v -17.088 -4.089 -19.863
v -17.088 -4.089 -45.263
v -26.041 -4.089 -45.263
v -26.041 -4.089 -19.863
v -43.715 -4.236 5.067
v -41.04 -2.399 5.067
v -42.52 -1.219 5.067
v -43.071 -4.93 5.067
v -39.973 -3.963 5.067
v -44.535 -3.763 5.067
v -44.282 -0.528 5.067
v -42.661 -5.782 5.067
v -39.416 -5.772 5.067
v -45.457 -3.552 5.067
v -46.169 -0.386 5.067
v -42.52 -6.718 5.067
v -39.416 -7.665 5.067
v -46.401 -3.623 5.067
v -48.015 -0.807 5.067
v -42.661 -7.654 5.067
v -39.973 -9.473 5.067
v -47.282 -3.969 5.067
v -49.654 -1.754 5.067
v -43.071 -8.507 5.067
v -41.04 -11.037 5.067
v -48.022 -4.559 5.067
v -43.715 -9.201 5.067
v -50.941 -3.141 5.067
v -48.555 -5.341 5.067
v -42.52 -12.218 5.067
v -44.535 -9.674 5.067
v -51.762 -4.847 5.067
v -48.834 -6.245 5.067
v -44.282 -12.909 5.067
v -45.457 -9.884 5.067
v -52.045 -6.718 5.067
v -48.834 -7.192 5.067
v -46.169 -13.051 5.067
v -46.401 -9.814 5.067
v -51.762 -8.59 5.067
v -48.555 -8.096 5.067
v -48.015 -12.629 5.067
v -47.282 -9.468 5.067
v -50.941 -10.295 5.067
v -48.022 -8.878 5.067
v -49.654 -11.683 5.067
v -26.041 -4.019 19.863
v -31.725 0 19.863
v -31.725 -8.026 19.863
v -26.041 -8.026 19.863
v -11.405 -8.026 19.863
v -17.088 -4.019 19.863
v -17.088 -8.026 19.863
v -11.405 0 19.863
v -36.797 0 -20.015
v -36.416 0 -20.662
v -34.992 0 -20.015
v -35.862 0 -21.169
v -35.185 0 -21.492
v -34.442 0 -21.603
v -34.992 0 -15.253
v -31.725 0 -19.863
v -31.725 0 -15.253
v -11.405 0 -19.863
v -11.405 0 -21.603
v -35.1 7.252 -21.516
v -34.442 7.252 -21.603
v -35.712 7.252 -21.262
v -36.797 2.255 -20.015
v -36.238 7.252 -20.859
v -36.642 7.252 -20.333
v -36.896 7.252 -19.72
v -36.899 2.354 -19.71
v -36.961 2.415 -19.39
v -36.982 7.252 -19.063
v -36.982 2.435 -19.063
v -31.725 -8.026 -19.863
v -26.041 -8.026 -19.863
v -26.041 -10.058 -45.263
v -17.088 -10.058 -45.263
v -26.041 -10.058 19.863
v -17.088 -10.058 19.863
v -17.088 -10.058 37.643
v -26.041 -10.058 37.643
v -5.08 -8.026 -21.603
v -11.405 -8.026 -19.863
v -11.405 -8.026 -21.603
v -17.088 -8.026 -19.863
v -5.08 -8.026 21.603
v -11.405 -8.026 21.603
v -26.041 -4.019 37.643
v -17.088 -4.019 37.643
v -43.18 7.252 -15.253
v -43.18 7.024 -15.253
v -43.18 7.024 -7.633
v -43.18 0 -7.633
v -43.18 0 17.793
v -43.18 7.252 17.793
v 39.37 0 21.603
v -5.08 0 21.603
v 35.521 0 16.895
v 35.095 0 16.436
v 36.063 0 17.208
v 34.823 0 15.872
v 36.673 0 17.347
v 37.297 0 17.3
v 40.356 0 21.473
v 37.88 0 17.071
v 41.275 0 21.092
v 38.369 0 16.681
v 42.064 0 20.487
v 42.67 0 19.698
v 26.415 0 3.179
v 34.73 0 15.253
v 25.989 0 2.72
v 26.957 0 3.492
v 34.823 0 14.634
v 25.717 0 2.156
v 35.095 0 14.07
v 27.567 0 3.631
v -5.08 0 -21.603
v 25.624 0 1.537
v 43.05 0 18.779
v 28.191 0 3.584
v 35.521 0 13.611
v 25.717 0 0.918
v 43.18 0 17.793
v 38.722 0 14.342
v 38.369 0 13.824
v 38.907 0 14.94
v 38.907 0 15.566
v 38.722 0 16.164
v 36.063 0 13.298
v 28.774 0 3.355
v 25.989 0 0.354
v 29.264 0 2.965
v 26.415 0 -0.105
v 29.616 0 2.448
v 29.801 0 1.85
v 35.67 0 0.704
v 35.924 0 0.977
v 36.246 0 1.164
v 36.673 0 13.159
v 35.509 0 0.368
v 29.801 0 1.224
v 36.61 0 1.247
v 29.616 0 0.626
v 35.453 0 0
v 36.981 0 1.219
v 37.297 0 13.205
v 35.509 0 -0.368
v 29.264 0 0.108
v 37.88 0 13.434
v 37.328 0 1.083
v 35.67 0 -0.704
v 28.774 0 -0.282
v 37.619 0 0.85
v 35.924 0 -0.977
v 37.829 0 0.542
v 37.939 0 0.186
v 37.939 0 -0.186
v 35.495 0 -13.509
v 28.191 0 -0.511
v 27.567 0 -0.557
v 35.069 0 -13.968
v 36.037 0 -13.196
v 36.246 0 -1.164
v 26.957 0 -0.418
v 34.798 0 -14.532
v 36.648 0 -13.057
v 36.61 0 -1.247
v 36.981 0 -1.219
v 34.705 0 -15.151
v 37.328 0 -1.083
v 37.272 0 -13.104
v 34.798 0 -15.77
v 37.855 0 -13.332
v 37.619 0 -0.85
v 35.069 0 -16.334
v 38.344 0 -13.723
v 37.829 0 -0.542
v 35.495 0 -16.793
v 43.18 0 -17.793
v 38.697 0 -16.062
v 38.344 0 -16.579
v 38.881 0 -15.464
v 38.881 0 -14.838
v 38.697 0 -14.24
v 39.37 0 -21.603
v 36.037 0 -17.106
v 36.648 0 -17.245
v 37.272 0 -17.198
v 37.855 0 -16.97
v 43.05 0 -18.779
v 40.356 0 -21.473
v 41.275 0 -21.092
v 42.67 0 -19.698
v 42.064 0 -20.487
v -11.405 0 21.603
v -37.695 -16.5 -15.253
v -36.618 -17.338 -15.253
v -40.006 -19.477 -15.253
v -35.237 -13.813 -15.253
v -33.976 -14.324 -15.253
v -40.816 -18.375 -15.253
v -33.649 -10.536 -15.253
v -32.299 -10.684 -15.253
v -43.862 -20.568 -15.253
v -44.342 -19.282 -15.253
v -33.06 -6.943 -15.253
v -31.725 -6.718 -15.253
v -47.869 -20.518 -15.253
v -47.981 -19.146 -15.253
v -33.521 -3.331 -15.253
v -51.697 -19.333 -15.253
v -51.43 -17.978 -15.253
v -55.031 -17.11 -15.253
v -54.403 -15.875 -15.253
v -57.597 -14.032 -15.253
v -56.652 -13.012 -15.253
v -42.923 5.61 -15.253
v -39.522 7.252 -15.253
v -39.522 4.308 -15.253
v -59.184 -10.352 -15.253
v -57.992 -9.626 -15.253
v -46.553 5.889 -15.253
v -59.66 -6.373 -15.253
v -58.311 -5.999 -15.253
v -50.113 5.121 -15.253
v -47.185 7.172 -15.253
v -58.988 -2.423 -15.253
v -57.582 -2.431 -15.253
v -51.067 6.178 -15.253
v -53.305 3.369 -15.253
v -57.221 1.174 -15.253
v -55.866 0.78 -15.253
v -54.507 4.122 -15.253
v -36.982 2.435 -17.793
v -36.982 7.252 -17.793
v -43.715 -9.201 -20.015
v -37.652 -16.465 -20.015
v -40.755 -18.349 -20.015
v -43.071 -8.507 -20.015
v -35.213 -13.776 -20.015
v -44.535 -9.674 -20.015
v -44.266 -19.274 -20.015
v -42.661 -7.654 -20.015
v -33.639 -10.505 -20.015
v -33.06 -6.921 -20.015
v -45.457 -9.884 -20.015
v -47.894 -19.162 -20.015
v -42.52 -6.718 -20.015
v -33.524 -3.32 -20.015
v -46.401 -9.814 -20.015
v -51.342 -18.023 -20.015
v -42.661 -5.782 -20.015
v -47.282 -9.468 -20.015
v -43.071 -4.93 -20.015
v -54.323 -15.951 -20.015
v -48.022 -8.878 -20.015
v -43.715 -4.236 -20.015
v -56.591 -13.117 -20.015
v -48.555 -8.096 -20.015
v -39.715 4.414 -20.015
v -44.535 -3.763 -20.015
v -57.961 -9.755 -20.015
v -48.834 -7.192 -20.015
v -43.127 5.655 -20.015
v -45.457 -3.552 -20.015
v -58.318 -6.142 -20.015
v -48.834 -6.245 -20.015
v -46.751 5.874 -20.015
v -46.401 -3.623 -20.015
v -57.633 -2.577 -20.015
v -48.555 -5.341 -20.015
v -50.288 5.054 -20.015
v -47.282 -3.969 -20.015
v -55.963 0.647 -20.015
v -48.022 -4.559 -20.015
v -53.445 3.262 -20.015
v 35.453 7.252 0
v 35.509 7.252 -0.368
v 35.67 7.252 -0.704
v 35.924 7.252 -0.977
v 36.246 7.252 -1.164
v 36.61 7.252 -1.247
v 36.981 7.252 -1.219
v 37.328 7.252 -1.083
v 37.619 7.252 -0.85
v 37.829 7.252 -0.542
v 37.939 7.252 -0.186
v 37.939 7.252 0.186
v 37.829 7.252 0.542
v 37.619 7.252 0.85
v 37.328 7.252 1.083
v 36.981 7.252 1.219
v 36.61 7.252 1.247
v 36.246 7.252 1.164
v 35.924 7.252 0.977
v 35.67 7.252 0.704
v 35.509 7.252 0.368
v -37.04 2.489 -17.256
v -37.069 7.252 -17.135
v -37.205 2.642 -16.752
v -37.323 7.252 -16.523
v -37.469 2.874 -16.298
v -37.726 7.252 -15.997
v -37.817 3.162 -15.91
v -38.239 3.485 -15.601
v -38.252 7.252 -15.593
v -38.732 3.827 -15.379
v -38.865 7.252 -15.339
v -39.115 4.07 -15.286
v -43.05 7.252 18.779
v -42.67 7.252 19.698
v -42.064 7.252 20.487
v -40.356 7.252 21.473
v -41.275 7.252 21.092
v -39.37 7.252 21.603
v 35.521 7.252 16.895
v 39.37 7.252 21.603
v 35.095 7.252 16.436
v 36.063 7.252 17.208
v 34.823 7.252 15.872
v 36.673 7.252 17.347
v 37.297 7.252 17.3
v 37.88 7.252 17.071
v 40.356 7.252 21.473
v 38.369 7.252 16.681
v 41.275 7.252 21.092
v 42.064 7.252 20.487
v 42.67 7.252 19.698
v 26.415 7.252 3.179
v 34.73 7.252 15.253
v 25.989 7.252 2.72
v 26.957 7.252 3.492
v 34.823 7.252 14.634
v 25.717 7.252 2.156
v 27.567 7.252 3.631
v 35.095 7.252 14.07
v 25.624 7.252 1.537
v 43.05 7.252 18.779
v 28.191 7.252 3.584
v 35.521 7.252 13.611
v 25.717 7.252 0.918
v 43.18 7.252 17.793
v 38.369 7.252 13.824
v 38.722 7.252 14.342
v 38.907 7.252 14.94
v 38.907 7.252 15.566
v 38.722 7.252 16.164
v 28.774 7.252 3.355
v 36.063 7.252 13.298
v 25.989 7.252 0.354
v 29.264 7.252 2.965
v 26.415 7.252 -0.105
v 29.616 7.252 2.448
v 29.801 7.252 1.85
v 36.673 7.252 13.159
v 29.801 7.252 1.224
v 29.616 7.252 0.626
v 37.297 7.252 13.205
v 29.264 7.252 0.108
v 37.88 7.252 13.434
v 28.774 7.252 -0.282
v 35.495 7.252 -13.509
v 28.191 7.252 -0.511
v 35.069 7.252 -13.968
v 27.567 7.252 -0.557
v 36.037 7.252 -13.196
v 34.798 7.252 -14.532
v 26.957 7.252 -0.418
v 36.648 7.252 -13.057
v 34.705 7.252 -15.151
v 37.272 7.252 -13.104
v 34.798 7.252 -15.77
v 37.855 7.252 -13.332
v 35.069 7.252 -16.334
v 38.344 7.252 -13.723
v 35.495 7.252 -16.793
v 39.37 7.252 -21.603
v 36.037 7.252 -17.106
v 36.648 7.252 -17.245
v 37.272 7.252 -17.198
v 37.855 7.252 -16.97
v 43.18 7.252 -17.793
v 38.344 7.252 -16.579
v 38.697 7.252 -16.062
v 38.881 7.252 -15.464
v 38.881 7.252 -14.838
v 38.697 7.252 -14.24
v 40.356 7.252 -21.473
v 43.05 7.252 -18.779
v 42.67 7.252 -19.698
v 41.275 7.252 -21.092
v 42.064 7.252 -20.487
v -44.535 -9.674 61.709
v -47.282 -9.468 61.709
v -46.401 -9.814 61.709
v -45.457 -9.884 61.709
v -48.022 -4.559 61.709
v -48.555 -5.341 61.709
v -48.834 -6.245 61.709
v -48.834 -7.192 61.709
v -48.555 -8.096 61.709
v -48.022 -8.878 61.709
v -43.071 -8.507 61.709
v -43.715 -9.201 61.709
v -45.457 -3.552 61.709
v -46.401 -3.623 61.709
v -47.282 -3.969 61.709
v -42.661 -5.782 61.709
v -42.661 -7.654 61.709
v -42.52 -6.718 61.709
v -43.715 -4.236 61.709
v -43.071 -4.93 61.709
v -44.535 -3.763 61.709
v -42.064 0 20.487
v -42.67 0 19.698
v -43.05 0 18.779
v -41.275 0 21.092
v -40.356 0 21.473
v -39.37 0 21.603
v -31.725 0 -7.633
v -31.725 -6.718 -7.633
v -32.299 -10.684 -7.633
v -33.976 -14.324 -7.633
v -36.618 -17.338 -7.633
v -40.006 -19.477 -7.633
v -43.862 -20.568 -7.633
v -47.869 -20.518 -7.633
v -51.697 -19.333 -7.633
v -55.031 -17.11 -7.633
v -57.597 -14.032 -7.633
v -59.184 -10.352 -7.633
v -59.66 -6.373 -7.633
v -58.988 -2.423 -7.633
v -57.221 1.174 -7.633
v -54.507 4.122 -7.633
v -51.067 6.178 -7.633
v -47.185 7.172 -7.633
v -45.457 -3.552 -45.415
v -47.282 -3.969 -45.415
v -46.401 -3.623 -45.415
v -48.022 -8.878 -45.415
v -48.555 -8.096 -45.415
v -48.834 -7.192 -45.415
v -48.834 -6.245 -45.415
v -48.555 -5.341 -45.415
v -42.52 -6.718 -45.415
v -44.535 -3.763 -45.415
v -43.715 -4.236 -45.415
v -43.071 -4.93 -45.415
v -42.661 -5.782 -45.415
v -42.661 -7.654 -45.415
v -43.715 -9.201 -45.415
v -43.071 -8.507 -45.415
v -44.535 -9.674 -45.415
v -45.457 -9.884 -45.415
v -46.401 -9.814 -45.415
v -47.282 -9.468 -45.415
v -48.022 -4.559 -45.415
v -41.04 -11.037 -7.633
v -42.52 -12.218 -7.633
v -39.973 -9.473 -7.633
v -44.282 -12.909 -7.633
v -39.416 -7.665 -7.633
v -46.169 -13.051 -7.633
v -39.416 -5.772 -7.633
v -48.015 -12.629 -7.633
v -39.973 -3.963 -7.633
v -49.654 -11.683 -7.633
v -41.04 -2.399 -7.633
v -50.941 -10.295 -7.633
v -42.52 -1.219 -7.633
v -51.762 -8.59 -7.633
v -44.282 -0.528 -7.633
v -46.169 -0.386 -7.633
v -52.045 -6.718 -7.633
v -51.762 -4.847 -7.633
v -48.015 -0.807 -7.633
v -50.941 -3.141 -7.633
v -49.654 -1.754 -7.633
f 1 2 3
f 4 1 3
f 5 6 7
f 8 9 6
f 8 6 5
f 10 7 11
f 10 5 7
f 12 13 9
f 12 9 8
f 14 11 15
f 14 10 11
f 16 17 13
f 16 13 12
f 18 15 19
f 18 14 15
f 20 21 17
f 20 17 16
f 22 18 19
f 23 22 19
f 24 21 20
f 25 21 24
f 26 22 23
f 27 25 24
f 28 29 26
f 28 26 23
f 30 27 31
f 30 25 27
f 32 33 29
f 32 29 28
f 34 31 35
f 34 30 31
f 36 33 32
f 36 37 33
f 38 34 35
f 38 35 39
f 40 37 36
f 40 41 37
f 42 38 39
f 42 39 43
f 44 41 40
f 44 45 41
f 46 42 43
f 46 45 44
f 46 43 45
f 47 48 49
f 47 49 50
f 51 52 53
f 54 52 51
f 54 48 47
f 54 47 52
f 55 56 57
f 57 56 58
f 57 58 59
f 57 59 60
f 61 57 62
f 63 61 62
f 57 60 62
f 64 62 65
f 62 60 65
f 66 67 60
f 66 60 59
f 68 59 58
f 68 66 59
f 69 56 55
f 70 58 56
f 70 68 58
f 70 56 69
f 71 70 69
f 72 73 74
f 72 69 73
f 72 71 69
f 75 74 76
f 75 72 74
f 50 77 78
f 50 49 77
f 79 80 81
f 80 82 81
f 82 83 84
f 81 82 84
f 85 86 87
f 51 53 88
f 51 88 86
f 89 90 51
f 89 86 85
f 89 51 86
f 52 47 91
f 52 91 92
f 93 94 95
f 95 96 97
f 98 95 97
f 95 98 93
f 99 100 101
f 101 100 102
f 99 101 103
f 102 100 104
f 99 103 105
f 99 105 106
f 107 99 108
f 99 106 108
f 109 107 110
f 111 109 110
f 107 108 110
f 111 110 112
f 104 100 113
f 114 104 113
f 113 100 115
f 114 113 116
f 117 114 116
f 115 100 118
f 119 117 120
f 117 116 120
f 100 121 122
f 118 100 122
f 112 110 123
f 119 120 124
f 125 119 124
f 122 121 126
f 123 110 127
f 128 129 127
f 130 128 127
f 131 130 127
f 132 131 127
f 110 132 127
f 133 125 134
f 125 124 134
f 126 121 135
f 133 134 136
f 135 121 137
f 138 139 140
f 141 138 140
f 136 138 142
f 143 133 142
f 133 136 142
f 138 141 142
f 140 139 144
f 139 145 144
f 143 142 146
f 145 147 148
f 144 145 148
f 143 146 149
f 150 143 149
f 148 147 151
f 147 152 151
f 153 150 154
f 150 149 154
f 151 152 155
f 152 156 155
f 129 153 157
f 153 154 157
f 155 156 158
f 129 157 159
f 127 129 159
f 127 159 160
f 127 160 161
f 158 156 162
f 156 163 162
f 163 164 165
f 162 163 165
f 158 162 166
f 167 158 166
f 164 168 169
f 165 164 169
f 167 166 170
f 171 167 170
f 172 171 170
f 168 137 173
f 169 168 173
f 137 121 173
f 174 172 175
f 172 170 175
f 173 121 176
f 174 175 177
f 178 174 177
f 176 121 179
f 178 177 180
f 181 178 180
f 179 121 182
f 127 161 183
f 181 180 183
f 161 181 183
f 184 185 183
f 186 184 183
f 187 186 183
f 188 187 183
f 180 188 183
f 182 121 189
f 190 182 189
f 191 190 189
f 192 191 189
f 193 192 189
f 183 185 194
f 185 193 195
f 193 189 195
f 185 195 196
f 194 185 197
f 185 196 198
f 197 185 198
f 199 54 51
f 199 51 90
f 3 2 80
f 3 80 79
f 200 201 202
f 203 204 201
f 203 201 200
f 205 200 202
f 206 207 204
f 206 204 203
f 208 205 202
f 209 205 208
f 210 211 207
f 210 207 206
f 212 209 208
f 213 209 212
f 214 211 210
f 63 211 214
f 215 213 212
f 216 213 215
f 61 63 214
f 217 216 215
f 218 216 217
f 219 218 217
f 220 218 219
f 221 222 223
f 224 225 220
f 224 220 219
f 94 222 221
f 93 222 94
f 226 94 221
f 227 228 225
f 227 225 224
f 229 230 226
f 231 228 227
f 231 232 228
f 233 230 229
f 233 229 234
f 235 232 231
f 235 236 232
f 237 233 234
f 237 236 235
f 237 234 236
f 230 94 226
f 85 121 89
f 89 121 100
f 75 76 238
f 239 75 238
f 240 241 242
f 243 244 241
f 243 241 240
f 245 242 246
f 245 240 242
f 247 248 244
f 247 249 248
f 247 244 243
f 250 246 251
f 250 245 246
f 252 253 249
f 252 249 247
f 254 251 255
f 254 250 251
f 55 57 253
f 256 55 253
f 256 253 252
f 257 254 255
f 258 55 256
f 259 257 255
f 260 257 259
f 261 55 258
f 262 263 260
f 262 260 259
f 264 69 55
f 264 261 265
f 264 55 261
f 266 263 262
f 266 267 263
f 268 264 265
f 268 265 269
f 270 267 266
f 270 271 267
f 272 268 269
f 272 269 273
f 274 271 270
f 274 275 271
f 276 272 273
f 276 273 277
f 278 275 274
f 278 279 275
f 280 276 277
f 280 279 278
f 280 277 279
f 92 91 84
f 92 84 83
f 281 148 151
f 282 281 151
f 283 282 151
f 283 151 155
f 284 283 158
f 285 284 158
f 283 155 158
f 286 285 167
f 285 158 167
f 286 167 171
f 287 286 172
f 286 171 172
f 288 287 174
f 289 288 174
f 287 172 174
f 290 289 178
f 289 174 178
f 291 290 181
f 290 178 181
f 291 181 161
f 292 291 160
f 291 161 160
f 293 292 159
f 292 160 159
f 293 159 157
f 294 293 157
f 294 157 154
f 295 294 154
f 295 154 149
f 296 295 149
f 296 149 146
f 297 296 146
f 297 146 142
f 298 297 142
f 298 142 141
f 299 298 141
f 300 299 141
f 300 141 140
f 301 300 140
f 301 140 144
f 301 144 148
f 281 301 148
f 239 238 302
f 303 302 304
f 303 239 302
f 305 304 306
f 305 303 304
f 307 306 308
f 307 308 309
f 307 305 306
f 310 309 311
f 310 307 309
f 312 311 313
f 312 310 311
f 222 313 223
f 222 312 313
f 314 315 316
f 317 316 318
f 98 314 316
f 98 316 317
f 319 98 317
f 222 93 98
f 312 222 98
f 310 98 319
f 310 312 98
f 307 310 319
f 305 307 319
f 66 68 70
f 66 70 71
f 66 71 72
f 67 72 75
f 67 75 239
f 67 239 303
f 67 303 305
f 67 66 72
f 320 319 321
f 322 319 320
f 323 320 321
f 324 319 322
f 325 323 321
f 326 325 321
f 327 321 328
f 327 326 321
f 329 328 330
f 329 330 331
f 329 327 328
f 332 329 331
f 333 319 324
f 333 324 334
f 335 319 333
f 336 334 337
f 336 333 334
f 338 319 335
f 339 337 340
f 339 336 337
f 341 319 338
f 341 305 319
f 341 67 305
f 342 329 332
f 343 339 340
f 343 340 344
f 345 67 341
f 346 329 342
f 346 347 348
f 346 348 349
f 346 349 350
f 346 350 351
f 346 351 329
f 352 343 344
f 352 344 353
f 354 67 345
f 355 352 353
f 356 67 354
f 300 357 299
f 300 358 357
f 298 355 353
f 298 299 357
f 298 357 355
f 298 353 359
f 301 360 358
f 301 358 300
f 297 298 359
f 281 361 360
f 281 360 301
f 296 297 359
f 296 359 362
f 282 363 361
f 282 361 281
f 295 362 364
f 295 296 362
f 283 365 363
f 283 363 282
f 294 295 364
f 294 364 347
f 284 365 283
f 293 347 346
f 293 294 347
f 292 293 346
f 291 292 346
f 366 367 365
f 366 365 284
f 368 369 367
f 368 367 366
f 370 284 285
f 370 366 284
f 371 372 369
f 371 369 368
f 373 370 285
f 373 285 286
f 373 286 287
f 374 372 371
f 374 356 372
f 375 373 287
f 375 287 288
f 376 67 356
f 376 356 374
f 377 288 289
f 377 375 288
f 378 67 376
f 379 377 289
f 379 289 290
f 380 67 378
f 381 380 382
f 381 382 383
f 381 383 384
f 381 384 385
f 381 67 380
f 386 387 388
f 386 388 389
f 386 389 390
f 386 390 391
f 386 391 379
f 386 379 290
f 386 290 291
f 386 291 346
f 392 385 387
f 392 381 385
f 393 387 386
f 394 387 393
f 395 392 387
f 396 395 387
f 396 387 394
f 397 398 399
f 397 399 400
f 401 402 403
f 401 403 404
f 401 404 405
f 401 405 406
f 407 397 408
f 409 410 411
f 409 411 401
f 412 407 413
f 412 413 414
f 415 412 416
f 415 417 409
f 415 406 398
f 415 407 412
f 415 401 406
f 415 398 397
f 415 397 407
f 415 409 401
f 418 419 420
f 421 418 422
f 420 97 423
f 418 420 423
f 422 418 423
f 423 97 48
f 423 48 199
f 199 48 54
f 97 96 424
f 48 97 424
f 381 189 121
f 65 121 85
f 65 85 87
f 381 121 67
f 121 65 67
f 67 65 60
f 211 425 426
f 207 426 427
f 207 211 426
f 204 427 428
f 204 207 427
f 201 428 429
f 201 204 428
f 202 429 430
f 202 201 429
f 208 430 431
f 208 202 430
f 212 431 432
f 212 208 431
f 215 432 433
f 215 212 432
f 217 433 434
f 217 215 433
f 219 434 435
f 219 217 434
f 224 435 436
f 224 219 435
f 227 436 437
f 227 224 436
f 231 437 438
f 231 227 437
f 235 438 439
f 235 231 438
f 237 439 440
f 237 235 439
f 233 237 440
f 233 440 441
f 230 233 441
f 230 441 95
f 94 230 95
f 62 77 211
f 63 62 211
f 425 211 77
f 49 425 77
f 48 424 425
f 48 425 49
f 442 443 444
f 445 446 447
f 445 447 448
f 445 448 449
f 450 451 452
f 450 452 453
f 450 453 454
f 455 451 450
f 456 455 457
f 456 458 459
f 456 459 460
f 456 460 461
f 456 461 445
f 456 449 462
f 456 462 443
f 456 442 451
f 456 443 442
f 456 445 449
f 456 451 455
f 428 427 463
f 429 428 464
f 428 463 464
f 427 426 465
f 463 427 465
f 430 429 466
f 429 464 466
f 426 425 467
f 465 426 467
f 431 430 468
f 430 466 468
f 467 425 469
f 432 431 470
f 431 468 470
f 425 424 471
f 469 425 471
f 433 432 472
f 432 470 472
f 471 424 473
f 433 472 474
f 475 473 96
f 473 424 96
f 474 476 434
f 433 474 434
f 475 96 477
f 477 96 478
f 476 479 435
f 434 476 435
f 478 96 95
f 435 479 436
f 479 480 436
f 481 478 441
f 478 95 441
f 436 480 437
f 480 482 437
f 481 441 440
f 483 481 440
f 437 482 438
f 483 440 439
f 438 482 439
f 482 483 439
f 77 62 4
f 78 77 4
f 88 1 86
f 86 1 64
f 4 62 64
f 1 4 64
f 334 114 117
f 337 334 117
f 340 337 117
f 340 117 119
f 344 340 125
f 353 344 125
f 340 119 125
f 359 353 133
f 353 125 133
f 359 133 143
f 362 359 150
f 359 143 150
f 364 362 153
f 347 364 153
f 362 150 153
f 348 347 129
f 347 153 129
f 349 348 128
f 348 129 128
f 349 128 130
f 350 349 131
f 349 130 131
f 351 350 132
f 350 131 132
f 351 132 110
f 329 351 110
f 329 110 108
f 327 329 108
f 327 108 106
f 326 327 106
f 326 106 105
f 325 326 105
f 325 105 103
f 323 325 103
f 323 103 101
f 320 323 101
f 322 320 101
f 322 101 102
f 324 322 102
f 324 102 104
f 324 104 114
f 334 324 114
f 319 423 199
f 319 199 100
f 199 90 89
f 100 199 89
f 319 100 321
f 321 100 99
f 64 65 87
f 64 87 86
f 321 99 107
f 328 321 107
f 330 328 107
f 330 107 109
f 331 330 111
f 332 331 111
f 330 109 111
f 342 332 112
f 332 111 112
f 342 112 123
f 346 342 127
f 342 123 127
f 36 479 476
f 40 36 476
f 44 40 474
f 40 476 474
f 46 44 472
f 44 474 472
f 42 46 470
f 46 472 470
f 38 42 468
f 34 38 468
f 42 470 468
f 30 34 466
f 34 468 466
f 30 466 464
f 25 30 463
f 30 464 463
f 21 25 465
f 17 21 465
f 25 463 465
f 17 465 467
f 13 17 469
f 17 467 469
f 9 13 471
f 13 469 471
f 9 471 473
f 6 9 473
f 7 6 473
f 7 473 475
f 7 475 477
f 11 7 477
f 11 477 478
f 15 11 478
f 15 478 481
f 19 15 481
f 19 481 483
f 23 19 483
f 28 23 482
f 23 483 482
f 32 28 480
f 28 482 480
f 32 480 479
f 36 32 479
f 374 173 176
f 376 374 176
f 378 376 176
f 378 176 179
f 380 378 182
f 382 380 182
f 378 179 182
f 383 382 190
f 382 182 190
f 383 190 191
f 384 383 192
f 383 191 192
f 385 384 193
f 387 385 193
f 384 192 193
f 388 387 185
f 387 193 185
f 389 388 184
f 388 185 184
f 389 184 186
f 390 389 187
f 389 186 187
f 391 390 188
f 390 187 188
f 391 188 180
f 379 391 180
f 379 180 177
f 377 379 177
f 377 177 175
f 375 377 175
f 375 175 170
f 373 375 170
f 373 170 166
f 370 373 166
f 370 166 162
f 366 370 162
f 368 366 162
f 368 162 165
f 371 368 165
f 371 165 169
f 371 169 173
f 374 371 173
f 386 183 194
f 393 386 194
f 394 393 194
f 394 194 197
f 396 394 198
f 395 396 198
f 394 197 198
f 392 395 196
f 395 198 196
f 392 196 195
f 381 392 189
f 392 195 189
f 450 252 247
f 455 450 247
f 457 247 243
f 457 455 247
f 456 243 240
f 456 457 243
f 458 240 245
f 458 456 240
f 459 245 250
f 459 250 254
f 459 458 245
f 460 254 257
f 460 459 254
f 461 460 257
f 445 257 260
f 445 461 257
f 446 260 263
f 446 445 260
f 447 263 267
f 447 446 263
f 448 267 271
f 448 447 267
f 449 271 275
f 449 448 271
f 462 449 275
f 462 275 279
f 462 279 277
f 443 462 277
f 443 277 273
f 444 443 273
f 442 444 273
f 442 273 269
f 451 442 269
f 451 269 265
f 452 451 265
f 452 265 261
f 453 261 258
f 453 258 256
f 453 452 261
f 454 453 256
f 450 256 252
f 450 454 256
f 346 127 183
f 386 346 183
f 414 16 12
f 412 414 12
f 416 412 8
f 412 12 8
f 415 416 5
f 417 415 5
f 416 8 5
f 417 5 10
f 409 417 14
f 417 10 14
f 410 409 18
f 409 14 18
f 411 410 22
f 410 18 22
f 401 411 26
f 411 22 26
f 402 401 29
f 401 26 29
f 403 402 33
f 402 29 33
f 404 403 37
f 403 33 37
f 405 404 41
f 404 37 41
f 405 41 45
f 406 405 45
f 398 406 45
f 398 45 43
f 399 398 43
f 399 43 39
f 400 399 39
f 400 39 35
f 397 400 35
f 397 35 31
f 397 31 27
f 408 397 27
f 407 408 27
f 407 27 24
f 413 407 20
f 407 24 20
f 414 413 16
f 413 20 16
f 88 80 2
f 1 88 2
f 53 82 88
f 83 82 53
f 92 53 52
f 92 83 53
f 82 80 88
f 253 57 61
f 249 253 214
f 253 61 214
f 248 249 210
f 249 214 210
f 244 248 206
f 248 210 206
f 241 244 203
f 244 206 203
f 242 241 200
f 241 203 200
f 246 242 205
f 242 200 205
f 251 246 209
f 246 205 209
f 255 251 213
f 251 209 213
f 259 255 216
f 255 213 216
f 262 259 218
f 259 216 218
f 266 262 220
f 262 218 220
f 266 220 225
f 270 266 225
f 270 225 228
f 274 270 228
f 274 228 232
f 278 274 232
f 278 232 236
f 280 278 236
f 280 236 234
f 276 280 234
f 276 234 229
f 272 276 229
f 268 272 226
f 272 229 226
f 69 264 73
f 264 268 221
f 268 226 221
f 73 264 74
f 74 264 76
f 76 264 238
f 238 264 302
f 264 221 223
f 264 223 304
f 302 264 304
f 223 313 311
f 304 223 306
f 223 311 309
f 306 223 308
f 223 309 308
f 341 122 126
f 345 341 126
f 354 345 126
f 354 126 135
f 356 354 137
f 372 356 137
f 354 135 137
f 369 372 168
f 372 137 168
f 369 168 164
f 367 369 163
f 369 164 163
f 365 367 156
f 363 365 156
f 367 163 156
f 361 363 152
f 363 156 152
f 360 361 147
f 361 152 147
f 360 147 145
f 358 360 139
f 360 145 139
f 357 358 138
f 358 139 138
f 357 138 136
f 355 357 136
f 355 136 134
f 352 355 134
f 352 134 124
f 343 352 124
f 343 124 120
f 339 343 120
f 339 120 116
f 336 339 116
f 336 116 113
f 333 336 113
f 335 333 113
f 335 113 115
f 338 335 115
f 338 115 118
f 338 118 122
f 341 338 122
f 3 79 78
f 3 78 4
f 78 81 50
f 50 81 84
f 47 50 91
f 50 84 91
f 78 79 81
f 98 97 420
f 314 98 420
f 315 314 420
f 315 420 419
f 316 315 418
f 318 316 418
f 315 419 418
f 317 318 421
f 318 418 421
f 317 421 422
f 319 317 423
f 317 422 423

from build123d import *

# Parameters (mm, degrees)
BOSS_EXTRUDE1_DEPTH             = 7.2517
FILLET1_R                       = 2.54
SKETCH3_W                       = 6.3246
SKETCH3_H                       = 43.2054
BOSS_EXTRUDE2_DEPTH             = 8.0264
SKETCH4_W                       = 20.32
SKETCH4_H                       = 39.7256
BOSS_EXTRUDE3_DEPTH             = 8.0264
SKETCH5_W                       = 8.9535
SKETCH5_H                       = 39.7256
BOSS_EXTRUDE4_DEPTH             = 2.032
BOSS_EXTRUDE5_DEPTH             = 7.62
SKETCH7_R                       = 12.6365
BOSS_EXTRUDE6_DEPTH             = 4.7625
SKETCH8_R                       = 6.35
BOSS_EXTRUDE7_DEPTH             = 12.7
SKETCH10_R                      = 3.175
BOSS_EXTRUDE8_DEPTH             = 56.642
BOSS_EXTRUDE9_START             = 25.4
SKETCH12_R                      = 3.175
BOSS_EXTRUDE9_DEPTH             = 25.4
SKETCH15_W                      = 8.9535
SKETCH15_H                      = 6.039178017
BOSS_EXTRUDE12_DEPTH            = 17.78
SKETCH14_W                      = 8.9535
SKETCH14_H                      = 5.969
BOSS_EXTRUDE13_DEPTH            = 25.4
TAP_DRILL_FOR_M5X0_8_TAP1_D     = 4.2
TAP_DRILL_FOR_M5X0_8_TAP1_DEPTH = 25.4
TAP_DRILL_FOR_M5X0_8_TAP1_TIP   = 1.2618073
TAP_DRILL_FOR_M3X0_5_TAP1_D     = 2.5
TAP_DRILL_FOR_M3X0_5_TAP1_DEPTH = 25.4
TAP_DRILL_FOR_M3X0_5_TAP1_TIP   = 0.751075774
TAP_DRILL_FOR_M5X0_8_TAP2_D     = 4.2
TAP_DRILL_FOR_M5X0_8_TAP2_DEPTH = 25.4
TAP_DRILL_FOR_M5X0_8_TAP2_TIP   = 1.2618073


with BuildPart() as part:
    # Sketch1 → Boss-Extrude1 (new body)
    with BuildSketch(Plane(origin=(0, 0, 0), x_dir=(1, 0, 0), z_dir=(0, 1, 0))):
        with BuildLine():
            Line((39.37, 21.6027), (-36.9824, 21.6027))
            Line((-36.9824, 21.6027), (-36.9824, 15.2527))
            Line((-36.9824, 15.2527), (-36.9824, -21.6027))
            Line((-36.9824, -21.6027), (39.37, -21.6027))
            ThreePointArc((39.37, -21.6027), (42.064076836, -20.486776836), (43.18, -17.7927))
            Line((43.18, -17.7927), (43.18, 17.7927))
            ThreePointArc((43.18, 17.7927), (42.064076836, 20.486776836), (39.37, 21.6027))
        make_face()
        with BuildLine():
            Line((-36.9824, -21.6027), (-36.9824, 15.2527))
            Line((-36.9824, 15.2527), (-43.18, 15.2527))
            Line((-43.18, 15.2527), (-43.18, -17.7927))
            ThreePointArc((-43.18, -17.7927), (-42.064076836, -20.486776836), (-39.37, -21.6027))
            Line((-39.37, -21.6027), (-36.9824, -21.6027))
        make_face()
    extrude(amount=BOSS_EXTRUDE1_DEPTH)

    # Fillet1
    fillet1_edges = [part.edges().sort_by_distance(p)[0] for p in [
        (-36.9824, 3.62585, -15.2527),
        (-36.9824, 3.62585, -21.6027),
    ]]
    fillet(fillet1_edges, radius=FILLET1_R)

    # Sketch3 → Boss-Extrude2 (add)
    with BuildSketch(Plane.XZ):
        with Locations((-8.2423, 0)):
            Rectangle(SKETCH3_W, SKETCH3_H)
    extrude(amount=BOSS_EXTRUDE2_DEPTH)

    # Sketch4 → Boss-Extrude3 (add)
    with BuildSketch(Plane.XZ):
        with Locations((-21.5646, 0)):
            Rectangle(SKETCH4_W, SKETCH4_H)
    extrude(amount=BOSS_EXTRUDE3_DEPTH)

    # Sketch5 → Boss-Extrude4 (add)
    with BuildSketch(Plane.XZ.offset(8.0264)):
        with Locations((-21.5646, 0)):
            Rectangle(SKETCH5_W, SKETCH5_H)
    extrude(amount=BOSS_EXTRUDE4_DEPTH)

    # Sketch6 → Boss-Extrude5 (add)
    with BuildSketch(Plane(origin=(0, 0, -15.2527), x_dir=(-1, 0, 0), z_dir=(0, 0, -1))):
        with BuildLine():
            Line((31.7246, 0), (31.7246, -6.7183))
            ThreePointArc((31.7246, -6.7183), (59.227378961, -10.185978415), (33.44611662, 0))
            Line((33.44611662, 0), (31.7246, 0))
        make_face()
    extrude(amount=-BOSS_EXTRUDE5_DEPTH)

    # Sketch7 → Boss-Extrude6 (add)
    with BuildSketch(Plane(origin=(0, 0, -15.2527), x_dir=(-1, 0, 0), z_dir=(0, 0, -1))):
        with Locations((45.6946, -6.7183)):
            Circle(SKETCH7_R)
    extrude(amount=BOSS_EXTRUDE6_DEPTH)

    # Sketch8 → Boss-Extrude7 (add)
    with BuildSketch(Plane.XY.offset(-7.6327)):
        with Locations(Location((-45.6946, -6.7183, 0), (0, 0, 180))):
            Circle(SKETCH8_R)
    extrude(amount=BOSS_EXTRUDE7_DEPTH)

    # Sketch10 → Boss-Extrude8 (add)
    with BuildSketch(Plane.XY.offset(5.0673)):
        with Locations((-45.6946, -6.7183)):
            Circle(SKETCH10_R)
    extrude(amount=BOSS_EXTRUDE8_DEPTH)

    # Sketch12 → Boss-Extrude9 (add)
    with BuildSketch(Plane(origin=(0, 0, -20.0152), x_dir=(-1, 0, 0), z_dir=(0, 0, -1)).offset(BOSS_EXTRUDE9_START)):
        with Locations(Location((45.6946, -6.7183, 0), (0, 0, 180))):
            Circle(SKETCH12_R)
    extrude(amount=-BOSS_EXTRUDE9_DEPTH)

    # Sketch15 → Boss-Extrude12 (add)
    with BuildSketch(Plane.XY.offset(19.8628)):
        with Locations((-21.5646, -7.038810992)):
            Rectangle(SKETCH15_W, SKETCH15_H)
    extrude(amount=BOSS_EXTRUDE12_DEPTH)

    # Sketch14 → Boss-Extrude13 (add)
    with BuildSketch(Plane(origin=(0, 0, -19.8628), x_dir=(-1, 0, 0), z_dir=(0, 0, -1))):
        with Locations((21.5646, -7.0739)):
            Rectangle(SKETCH14_W, SKETCH14_H)
    extrude(amount=BOSS_EXTRUDE13_DEPTH)

    # Tap Drill for M5x0.8 Tap1
    with Locations(Plane(origin=(0, 7.2517, 0), x_dir=(1, 0, 0), z_dir=(0, 1, 0))):
        with Locations((36.8046, 15.1511), (36.83, -15.2527)):
            Hole(TAP_DRILL_FOR_M5X0_8_TAP1_D / 2, depth=TAP_DRILL_FOR_M5X0_8_TAP1_DEPTH)
            with Locations((0, 0, -(TAP_DRILL_FOR_M5X0_8_TAP1_DEPTH + TAP_DRILL_FOR_M5X0_8_TAP1_TIP / 2))):  # 118° drill point
                Cone(0, TAP_DRILL_FOR_M5X0_8_TAP1_D / 2, TAP_DRILL_FOR_M5X0_8_TAP1_TIP, mode=Mode.SUBTRACT)

    # Tap Drill for M3x0.5 Tap1
    with Locations(Plane(origin=(0, 7.2517, 0), x_dir=(1, 0, 0), z_dir=(0, 1, 0))):
        with Locations((36.703, 0)):
            Hole(TAP_DRILL_FOR_M3X0_5_TAP1_D / 2, depth=TAP_DRILL_FOR_M3X0_5_TAP1_DEPTH)
            with Locations((0, 0, -(TAP_DRILL_FOR_M3X0_5_TAP1_DEPTH + TAP_DRILL_FOR_M3X0_5_TAP1_TIP / 2))):  # 118° drill point
                Cone(0, TAP_DRILL_FOR_M3X0_5_TAP1_D / 2, TAP_DRILL_FOR_M3X0_5_TAP1_TIP, mode=Mode.SUBTRACT)

    # Tap Drill for M5x0.8 Tap2
    with Locations(Plane(origin=(0, 7.2517, 0), x_dir=(1, 0, 0), z_dir=(0, 1, 0))):
        with Locations((27.7241, -1.5367)):
            Hole(TAP_DRILL_FOR_M5X0_8_TAP2_D / 2, depth=TAP_DRILL_FOR_M5X0_8_TAP2_DEPTH)
            with Locations((0, 0, -(TAP_DRILL_FOR_M5X0_8_TAP2_DEPTH + TAP_DRILL_FOR_M5X0_8_TAP2_TIP / 2))):  # 118° drill point
                Cone(0, TAP_DRILL_FOR_M5X0_8_TAP2_D / 2, TAP_DRILL_FOR_M5X0_8_TAP2_TIP, mode=Mode.SUBTRACT)


solid = part.part
